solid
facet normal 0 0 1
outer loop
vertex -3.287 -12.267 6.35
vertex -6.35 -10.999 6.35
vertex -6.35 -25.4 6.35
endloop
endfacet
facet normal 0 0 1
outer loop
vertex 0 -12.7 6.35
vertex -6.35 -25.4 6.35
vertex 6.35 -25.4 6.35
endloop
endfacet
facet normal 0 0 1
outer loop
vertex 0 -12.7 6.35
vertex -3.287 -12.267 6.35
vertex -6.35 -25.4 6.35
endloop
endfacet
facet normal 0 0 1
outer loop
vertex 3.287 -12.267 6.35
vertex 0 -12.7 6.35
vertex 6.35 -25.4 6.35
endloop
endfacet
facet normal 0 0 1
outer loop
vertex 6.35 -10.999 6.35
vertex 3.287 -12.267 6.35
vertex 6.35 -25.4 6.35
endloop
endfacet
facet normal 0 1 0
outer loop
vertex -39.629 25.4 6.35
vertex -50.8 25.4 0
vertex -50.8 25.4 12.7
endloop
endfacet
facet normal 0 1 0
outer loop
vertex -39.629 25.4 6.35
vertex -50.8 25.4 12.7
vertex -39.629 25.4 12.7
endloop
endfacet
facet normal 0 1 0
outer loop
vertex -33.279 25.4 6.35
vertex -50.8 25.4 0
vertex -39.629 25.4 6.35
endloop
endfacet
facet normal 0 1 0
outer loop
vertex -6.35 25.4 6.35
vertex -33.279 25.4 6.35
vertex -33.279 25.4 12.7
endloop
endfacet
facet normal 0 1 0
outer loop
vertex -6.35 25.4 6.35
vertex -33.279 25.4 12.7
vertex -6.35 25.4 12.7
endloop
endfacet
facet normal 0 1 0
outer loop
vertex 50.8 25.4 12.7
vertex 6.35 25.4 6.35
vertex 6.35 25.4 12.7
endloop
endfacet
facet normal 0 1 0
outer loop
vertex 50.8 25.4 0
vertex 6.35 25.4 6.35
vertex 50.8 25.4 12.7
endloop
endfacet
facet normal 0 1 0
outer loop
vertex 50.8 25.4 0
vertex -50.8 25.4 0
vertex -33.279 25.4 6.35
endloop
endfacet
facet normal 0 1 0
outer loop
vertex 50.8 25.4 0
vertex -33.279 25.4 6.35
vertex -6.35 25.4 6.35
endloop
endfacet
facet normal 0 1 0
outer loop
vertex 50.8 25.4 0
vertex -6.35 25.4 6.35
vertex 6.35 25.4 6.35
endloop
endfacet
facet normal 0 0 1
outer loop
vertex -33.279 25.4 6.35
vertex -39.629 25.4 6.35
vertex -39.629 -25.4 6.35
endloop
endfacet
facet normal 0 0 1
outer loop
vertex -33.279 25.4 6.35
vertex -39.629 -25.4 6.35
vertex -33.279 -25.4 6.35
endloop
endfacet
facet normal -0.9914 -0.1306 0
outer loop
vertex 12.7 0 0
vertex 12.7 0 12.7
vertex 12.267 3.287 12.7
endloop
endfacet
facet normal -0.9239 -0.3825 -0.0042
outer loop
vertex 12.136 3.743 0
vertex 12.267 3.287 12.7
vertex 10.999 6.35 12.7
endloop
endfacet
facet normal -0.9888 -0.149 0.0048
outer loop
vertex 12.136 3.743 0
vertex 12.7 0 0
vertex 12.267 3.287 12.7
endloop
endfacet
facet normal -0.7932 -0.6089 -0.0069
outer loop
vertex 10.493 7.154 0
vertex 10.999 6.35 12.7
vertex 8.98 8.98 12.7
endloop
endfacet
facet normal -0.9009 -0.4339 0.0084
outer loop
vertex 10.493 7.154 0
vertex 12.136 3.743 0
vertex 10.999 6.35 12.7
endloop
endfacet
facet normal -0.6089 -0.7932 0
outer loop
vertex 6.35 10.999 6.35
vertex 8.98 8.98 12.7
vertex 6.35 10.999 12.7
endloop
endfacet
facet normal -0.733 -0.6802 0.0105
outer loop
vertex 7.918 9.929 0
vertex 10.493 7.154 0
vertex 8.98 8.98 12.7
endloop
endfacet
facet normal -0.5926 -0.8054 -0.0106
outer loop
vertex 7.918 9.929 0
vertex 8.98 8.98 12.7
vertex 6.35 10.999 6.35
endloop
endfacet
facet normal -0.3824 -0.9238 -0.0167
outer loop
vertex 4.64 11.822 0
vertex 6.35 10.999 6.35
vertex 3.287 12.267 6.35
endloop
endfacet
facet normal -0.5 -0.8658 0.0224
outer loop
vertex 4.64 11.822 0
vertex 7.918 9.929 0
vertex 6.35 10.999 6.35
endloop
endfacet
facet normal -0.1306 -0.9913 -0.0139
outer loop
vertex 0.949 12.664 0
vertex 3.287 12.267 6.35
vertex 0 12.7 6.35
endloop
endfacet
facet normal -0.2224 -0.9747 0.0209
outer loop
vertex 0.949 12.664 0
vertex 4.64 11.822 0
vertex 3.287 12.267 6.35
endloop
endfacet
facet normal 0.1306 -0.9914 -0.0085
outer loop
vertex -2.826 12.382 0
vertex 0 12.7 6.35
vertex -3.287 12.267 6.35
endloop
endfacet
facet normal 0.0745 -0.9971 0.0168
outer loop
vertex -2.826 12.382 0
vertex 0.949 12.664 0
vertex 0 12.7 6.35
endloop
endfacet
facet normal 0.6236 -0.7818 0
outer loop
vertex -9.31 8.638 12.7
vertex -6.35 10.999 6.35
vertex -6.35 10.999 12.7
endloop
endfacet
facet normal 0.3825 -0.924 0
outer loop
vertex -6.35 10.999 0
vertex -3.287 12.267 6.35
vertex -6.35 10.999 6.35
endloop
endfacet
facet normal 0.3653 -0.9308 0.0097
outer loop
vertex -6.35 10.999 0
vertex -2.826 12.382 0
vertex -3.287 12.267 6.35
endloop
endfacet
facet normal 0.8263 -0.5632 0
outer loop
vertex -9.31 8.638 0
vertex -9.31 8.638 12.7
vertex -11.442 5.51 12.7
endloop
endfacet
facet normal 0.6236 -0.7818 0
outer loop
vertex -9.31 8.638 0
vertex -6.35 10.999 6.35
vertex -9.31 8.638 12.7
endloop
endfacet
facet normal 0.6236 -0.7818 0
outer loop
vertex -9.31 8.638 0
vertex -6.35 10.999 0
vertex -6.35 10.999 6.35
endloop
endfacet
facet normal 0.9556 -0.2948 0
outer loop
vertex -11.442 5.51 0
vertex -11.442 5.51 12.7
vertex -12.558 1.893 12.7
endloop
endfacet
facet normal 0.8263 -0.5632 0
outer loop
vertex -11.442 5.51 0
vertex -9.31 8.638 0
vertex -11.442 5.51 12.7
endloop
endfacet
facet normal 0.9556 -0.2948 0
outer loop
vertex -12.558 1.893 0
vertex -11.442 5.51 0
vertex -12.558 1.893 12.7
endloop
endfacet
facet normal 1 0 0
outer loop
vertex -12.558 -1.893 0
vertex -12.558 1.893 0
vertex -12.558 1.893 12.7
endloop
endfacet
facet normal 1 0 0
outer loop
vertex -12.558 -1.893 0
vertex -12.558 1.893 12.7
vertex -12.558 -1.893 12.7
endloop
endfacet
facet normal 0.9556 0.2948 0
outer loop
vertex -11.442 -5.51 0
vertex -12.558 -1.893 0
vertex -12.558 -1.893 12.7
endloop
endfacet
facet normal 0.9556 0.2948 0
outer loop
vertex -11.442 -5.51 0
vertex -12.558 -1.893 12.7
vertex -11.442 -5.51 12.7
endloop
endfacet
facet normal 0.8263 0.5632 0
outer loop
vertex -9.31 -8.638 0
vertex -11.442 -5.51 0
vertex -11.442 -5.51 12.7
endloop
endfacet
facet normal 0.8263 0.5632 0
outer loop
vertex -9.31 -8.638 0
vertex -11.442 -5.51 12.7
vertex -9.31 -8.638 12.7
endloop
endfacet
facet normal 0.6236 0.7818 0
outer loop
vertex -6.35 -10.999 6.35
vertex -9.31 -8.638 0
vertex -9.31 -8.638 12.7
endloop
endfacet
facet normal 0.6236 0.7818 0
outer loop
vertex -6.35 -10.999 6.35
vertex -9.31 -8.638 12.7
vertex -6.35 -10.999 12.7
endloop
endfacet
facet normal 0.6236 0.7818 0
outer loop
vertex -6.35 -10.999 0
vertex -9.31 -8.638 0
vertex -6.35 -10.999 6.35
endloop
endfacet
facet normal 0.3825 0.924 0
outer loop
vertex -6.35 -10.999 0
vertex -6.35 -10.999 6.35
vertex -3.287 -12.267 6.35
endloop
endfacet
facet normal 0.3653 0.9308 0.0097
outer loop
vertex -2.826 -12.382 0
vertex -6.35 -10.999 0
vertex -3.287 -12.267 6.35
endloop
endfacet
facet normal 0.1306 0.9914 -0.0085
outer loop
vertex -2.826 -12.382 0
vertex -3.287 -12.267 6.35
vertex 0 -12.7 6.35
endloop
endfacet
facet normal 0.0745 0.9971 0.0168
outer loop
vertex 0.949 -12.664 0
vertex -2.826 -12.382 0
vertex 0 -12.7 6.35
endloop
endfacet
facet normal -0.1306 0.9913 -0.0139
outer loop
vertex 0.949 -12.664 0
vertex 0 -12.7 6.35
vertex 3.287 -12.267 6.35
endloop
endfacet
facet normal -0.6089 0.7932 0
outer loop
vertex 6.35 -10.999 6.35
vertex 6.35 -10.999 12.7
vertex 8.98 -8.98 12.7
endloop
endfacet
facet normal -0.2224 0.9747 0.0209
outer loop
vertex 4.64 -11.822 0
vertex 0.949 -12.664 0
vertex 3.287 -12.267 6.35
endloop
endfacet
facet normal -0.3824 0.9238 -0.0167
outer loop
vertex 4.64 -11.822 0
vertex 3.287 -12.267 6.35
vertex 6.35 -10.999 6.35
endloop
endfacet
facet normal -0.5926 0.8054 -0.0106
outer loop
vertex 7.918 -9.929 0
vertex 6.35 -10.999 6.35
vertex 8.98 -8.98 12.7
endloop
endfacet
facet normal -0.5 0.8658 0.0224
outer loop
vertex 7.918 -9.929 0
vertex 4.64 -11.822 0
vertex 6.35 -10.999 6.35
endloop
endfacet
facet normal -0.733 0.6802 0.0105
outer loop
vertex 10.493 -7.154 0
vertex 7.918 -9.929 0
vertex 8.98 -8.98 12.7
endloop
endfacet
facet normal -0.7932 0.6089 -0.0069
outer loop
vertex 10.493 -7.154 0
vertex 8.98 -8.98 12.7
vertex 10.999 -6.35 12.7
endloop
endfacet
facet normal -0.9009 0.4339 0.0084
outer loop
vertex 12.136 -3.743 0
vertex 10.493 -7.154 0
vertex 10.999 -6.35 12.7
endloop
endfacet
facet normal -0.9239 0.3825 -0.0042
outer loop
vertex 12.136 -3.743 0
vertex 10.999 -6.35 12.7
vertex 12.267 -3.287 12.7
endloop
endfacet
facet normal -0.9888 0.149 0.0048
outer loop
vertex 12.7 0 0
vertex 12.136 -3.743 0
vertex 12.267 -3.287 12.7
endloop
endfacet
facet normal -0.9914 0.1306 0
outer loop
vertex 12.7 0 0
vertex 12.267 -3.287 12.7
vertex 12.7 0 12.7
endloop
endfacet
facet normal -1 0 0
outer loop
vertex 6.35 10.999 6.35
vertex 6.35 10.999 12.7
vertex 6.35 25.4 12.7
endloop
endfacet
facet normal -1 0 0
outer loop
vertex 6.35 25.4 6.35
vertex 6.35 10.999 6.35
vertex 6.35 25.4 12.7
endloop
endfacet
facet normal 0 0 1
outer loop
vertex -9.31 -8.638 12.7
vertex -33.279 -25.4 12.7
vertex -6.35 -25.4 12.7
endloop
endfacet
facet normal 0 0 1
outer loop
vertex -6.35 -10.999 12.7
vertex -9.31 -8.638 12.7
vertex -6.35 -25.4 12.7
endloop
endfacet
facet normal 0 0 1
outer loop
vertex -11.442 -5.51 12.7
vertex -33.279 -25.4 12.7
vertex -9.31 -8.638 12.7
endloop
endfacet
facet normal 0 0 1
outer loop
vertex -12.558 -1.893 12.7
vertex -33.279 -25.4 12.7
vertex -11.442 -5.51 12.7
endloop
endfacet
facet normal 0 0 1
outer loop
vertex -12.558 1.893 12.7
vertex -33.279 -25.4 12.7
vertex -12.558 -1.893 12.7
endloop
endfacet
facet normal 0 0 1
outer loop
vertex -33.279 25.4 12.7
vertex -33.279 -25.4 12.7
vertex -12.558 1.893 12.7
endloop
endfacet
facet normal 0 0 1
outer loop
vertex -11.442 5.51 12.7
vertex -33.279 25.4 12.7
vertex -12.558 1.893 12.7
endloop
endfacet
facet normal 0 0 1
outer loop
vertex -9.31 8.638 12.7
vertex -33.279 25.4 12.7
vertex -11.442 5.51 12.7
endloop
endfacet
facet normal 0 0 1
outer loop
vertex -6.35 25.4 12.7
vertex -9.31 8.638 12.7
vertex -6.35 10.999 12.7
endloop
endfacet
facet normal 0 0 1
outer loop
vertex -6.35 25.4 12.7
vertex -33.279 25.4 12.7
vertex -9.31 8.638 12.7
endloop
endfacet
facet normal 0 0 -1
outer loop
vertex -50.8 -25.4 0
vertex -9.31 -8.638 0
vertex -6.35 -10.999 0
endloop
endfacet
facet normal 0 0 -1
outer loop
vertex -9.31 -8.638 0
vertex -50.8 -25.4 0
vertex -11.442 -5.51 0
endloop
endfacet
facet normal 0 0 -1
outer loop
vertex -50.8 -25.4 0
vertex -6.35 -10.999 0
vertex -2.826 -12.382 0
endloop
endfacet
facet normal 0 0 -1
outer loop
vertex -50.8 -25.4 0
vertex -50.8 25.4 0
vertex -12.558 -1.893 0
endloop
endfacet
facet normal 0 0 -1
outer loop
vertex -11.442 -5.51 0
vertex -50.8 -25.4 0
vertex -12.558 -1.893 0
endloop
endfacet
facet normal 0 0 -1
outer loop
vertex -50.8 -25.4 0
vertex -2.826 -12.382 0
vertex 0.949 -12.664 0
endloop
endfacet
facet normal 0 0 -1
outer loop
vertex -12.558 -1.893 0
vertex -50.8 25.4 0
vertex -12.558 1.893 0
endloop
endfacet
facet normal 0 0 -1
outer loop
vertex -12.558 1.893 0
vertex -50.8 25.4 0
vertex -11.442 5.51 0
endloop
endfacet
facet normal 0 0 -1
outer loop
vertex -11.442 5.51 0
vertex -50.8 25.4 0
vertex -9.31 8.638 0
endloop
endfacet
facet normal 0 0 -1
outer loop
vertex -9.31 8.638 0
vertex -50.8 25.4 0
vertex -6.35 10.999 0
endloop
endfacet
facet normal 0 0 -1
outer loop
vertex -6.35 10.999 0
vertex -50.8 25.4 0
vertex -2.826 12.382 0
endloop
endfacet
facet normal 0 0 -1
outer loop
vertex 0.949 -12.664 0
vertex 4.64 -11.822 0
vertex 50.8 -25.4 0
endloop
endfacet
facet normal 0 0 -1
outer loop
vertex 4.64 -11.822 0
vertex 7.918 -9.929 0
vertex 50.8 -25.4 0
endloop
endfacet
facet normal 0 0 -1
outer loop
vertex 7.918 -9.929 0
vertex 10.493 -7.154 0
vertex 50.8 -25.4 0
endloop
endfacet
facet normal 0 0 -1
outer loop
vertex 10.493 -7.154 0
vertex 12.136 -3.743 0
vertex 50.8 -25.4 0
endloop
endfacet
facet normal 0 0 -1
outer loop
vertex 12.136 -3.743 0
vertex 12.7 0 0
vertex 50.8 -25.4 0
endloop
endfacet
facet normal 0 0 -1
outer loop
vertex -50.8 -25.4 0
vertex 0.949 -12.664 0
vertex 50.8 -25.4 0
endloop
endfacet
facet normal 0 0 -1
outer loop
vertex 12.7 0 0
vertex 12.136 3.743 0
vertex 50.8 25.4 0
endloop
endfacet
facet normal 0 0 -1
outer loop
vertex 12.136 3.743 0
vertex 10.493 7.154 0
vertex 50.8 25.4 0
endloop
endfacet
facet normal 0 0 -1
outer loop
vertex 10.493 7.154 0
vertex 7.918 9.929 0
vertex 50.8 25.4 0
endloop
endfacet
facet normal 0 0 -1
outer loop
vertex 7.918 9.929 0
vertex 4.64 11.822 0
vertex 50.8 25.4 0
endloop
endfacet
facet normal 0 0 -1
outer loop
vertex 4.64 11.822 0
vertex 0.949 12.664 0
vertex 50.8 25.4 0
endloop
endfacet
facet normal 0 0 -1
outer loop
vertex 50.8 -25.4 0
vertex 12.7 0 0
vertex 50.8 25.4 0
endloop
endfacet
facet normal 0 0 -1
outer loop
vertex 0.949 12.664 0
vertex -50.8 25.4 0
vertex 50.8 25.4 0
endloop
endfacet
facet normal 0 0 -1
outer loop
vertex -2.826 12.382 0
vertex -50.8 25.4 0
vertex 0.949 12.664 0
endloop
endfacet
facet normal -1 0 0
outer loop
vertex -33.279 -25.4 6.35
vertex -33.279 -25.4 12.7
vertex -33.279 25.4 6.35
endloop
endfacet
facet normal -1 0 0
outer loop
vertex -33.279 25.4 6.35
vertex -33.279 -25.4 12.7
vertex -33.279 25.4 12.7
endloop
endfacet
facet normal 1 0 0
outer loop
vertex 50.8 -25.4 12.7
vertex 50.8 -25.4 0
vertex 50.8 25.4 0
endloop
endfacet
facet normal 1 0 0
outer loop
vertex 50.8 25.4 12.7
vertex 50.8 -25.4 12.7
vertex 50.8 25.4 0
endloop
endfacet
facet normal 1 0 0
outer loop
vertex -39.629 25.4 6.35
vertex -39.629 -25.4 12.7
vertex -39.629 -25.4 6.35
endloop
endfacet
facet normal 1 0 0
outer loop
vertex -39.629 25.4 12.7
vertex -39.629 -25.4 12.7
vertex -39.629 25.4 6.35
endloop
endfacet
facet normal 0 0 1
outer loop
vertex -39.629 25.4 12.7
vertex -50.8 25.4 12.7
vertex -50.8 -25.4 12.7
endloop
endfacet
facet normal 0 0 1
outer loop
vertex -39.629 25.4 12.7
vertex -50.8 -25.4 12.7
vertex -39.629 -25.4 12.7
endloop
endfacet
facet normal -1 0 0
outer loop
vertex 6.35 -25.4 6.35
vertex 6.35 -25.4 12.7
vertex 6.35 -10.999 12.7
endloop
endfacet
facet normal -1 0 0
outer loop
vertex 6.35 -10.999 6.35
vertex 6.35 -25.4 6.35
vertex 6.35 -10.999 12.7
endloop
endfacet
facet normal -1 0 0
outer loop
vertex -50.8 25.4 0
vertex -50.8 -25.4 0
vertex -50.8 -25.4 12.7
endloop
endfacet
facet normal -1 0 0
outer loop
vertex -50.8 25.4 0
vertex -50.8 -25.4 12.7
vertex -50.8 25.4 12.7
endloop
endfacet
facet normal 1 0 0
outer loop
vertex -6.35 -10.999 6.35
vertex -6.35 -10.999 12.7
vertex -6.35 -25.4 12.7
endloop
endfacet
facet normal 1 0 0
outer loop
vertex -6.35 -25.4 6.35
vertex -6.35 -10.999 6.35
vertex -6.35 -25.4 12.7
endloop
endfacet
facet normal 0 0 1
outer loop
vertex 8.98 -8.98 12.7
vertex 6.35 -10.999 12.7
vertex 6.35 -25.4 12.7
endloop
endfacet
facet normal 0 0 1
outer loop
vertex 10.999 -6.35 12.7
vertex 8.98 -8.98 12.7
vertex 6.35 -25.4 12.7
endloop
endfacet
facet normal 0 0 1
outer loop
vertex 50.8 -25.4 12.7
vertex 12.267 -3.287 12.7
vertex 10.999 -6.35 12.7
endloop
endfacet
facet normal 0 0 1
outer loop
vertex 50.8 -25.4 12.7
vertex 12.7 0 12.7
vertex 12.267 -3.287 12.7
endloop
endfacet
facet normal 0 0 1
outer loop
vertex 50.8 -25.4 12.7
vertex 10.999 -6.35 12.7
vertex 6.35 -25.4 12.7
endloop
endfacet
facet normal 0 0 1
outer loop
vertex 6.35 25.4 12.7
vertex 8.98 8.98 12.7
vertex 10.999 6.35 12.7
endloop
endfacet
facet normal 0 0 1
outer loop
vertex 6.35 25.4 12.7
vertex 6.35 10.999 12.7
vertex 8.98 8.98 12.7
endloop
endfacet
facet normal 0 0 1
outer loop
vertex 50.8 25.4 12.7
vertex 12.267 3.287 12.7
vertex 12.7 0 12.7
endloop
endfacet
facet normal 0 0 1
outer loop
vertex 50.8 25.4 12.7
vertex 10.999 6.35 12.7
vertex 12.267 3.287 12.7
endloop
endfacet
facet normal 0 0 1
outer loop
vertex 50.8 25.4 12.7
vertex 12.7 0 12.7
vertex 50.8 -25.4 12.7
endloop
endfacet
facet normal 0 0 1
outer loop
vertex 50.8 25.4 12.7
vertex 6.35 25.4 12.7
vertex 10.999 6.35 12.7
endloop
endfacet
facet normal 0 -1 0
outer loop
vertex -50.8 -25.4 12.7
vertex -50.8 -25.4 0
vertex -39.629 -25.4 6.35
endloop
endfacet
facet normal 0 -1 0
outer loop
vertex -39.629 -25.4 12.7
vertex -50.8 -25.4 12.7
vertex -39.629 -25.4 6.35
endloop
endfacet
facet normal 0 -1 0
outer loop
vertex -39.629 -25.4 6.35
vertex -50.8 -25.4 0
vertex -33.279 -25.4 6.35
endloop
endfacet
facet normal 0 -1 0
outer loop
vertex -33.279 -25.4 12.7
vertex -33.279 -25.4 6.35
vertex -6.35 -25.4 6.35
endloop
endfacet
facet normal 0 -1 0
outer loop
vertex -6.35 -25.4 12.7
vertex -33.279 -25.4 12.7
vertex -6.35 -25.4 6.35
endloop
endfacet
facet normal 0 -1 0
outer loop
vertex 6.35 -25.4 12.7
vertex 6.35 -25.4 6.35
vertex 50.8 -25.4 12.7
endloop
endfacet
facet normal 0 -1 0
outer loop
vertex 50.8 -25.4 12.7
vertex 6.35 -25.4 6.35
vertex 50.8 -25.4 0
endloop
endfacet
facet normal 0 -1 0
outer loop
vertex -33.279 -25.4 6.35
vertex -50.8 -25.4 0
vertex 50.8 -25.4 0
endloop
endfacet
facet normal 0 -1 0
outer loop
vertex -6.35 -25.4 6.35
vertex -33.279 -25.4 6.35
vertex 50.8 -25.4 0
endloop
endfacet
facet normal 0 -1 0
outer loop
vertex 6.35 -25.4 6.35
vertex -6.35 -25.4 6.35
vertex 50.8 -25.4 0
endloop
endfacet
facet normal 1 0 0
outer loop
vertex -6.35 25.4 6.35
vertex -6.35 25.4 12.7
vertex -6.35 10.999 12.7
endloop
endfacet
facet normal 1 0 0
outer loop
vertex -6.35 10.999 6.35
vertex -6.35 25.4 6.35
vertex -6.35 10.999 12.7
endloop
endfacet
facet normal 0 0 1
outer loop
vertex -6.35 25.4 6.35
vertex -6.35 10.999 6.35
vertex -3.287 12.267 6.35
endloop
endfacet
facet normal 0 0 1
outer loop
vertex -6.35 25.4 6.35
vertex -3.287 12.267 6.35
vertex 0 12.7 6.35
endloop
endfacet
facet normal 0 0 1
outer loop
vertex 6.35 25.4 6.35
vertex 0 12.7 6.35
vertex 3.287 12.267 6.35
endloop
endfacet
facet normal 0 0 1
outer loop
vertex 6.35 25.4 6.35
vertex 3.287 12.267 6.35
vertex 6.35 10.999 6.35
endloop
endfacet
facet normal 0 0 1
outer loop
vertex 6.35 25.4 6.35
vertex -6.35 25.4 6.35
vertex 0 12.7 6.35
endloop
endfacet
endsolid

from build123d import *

# Parameters (mm, degrees)
F0_W     = 101.6
F0_H     = 50.8
F0_R     = 12.7
F1_DEPTH = 12.7
F2_W     = 6.35
F2_H     = 50.8
F3_DEPTH = 6.35


with BuildPart() as f1:
    # F0 (on Top) → F1 (new body)
    with BuildSketch(Plane.XY):
        Rectangle(F0_W, F0_H)
        Circle(F0_R, mode=Mode.SUBTRACT)
    extrude(amount=F1_DEPTH)

    # F2 (on face) → F3 (cut)
    with BuildSketch(Plane.XY.offset(12.7)):
        with Locations((-36.4539266646, 0)):
            Rectangle(F2_W, F2_H)
        with BuildLine():
            Line((-6.35, -10.9985226281), (-6.35, -25.4))
            Line((-6.35, -25.4), (6.35, -25.4))
            Line((6.35, -25.4), (6.35, -10.9985226281))
            ThreePointArc((6.35, -10.9985226281), (0, -12.7), (-6.35, -10.9985226281))
        make_face()
        with BuildLine():
            Line((6.35, 25.4), (-6.35, 25.4))
            Line((-6.35, 25.4), (-6.35, 10.9985226281))
            ThreePointArc((-6.35, 10.9985226281), (0, 12.7), (6.35, 10.9985226281))
            Line((6.35, 10.9985226281), (6.35, 25.4))
        make_face()
    extrude(amount=-F3_DEPTH, mode=Mode.SUBTRACT)


solid = f1.part
